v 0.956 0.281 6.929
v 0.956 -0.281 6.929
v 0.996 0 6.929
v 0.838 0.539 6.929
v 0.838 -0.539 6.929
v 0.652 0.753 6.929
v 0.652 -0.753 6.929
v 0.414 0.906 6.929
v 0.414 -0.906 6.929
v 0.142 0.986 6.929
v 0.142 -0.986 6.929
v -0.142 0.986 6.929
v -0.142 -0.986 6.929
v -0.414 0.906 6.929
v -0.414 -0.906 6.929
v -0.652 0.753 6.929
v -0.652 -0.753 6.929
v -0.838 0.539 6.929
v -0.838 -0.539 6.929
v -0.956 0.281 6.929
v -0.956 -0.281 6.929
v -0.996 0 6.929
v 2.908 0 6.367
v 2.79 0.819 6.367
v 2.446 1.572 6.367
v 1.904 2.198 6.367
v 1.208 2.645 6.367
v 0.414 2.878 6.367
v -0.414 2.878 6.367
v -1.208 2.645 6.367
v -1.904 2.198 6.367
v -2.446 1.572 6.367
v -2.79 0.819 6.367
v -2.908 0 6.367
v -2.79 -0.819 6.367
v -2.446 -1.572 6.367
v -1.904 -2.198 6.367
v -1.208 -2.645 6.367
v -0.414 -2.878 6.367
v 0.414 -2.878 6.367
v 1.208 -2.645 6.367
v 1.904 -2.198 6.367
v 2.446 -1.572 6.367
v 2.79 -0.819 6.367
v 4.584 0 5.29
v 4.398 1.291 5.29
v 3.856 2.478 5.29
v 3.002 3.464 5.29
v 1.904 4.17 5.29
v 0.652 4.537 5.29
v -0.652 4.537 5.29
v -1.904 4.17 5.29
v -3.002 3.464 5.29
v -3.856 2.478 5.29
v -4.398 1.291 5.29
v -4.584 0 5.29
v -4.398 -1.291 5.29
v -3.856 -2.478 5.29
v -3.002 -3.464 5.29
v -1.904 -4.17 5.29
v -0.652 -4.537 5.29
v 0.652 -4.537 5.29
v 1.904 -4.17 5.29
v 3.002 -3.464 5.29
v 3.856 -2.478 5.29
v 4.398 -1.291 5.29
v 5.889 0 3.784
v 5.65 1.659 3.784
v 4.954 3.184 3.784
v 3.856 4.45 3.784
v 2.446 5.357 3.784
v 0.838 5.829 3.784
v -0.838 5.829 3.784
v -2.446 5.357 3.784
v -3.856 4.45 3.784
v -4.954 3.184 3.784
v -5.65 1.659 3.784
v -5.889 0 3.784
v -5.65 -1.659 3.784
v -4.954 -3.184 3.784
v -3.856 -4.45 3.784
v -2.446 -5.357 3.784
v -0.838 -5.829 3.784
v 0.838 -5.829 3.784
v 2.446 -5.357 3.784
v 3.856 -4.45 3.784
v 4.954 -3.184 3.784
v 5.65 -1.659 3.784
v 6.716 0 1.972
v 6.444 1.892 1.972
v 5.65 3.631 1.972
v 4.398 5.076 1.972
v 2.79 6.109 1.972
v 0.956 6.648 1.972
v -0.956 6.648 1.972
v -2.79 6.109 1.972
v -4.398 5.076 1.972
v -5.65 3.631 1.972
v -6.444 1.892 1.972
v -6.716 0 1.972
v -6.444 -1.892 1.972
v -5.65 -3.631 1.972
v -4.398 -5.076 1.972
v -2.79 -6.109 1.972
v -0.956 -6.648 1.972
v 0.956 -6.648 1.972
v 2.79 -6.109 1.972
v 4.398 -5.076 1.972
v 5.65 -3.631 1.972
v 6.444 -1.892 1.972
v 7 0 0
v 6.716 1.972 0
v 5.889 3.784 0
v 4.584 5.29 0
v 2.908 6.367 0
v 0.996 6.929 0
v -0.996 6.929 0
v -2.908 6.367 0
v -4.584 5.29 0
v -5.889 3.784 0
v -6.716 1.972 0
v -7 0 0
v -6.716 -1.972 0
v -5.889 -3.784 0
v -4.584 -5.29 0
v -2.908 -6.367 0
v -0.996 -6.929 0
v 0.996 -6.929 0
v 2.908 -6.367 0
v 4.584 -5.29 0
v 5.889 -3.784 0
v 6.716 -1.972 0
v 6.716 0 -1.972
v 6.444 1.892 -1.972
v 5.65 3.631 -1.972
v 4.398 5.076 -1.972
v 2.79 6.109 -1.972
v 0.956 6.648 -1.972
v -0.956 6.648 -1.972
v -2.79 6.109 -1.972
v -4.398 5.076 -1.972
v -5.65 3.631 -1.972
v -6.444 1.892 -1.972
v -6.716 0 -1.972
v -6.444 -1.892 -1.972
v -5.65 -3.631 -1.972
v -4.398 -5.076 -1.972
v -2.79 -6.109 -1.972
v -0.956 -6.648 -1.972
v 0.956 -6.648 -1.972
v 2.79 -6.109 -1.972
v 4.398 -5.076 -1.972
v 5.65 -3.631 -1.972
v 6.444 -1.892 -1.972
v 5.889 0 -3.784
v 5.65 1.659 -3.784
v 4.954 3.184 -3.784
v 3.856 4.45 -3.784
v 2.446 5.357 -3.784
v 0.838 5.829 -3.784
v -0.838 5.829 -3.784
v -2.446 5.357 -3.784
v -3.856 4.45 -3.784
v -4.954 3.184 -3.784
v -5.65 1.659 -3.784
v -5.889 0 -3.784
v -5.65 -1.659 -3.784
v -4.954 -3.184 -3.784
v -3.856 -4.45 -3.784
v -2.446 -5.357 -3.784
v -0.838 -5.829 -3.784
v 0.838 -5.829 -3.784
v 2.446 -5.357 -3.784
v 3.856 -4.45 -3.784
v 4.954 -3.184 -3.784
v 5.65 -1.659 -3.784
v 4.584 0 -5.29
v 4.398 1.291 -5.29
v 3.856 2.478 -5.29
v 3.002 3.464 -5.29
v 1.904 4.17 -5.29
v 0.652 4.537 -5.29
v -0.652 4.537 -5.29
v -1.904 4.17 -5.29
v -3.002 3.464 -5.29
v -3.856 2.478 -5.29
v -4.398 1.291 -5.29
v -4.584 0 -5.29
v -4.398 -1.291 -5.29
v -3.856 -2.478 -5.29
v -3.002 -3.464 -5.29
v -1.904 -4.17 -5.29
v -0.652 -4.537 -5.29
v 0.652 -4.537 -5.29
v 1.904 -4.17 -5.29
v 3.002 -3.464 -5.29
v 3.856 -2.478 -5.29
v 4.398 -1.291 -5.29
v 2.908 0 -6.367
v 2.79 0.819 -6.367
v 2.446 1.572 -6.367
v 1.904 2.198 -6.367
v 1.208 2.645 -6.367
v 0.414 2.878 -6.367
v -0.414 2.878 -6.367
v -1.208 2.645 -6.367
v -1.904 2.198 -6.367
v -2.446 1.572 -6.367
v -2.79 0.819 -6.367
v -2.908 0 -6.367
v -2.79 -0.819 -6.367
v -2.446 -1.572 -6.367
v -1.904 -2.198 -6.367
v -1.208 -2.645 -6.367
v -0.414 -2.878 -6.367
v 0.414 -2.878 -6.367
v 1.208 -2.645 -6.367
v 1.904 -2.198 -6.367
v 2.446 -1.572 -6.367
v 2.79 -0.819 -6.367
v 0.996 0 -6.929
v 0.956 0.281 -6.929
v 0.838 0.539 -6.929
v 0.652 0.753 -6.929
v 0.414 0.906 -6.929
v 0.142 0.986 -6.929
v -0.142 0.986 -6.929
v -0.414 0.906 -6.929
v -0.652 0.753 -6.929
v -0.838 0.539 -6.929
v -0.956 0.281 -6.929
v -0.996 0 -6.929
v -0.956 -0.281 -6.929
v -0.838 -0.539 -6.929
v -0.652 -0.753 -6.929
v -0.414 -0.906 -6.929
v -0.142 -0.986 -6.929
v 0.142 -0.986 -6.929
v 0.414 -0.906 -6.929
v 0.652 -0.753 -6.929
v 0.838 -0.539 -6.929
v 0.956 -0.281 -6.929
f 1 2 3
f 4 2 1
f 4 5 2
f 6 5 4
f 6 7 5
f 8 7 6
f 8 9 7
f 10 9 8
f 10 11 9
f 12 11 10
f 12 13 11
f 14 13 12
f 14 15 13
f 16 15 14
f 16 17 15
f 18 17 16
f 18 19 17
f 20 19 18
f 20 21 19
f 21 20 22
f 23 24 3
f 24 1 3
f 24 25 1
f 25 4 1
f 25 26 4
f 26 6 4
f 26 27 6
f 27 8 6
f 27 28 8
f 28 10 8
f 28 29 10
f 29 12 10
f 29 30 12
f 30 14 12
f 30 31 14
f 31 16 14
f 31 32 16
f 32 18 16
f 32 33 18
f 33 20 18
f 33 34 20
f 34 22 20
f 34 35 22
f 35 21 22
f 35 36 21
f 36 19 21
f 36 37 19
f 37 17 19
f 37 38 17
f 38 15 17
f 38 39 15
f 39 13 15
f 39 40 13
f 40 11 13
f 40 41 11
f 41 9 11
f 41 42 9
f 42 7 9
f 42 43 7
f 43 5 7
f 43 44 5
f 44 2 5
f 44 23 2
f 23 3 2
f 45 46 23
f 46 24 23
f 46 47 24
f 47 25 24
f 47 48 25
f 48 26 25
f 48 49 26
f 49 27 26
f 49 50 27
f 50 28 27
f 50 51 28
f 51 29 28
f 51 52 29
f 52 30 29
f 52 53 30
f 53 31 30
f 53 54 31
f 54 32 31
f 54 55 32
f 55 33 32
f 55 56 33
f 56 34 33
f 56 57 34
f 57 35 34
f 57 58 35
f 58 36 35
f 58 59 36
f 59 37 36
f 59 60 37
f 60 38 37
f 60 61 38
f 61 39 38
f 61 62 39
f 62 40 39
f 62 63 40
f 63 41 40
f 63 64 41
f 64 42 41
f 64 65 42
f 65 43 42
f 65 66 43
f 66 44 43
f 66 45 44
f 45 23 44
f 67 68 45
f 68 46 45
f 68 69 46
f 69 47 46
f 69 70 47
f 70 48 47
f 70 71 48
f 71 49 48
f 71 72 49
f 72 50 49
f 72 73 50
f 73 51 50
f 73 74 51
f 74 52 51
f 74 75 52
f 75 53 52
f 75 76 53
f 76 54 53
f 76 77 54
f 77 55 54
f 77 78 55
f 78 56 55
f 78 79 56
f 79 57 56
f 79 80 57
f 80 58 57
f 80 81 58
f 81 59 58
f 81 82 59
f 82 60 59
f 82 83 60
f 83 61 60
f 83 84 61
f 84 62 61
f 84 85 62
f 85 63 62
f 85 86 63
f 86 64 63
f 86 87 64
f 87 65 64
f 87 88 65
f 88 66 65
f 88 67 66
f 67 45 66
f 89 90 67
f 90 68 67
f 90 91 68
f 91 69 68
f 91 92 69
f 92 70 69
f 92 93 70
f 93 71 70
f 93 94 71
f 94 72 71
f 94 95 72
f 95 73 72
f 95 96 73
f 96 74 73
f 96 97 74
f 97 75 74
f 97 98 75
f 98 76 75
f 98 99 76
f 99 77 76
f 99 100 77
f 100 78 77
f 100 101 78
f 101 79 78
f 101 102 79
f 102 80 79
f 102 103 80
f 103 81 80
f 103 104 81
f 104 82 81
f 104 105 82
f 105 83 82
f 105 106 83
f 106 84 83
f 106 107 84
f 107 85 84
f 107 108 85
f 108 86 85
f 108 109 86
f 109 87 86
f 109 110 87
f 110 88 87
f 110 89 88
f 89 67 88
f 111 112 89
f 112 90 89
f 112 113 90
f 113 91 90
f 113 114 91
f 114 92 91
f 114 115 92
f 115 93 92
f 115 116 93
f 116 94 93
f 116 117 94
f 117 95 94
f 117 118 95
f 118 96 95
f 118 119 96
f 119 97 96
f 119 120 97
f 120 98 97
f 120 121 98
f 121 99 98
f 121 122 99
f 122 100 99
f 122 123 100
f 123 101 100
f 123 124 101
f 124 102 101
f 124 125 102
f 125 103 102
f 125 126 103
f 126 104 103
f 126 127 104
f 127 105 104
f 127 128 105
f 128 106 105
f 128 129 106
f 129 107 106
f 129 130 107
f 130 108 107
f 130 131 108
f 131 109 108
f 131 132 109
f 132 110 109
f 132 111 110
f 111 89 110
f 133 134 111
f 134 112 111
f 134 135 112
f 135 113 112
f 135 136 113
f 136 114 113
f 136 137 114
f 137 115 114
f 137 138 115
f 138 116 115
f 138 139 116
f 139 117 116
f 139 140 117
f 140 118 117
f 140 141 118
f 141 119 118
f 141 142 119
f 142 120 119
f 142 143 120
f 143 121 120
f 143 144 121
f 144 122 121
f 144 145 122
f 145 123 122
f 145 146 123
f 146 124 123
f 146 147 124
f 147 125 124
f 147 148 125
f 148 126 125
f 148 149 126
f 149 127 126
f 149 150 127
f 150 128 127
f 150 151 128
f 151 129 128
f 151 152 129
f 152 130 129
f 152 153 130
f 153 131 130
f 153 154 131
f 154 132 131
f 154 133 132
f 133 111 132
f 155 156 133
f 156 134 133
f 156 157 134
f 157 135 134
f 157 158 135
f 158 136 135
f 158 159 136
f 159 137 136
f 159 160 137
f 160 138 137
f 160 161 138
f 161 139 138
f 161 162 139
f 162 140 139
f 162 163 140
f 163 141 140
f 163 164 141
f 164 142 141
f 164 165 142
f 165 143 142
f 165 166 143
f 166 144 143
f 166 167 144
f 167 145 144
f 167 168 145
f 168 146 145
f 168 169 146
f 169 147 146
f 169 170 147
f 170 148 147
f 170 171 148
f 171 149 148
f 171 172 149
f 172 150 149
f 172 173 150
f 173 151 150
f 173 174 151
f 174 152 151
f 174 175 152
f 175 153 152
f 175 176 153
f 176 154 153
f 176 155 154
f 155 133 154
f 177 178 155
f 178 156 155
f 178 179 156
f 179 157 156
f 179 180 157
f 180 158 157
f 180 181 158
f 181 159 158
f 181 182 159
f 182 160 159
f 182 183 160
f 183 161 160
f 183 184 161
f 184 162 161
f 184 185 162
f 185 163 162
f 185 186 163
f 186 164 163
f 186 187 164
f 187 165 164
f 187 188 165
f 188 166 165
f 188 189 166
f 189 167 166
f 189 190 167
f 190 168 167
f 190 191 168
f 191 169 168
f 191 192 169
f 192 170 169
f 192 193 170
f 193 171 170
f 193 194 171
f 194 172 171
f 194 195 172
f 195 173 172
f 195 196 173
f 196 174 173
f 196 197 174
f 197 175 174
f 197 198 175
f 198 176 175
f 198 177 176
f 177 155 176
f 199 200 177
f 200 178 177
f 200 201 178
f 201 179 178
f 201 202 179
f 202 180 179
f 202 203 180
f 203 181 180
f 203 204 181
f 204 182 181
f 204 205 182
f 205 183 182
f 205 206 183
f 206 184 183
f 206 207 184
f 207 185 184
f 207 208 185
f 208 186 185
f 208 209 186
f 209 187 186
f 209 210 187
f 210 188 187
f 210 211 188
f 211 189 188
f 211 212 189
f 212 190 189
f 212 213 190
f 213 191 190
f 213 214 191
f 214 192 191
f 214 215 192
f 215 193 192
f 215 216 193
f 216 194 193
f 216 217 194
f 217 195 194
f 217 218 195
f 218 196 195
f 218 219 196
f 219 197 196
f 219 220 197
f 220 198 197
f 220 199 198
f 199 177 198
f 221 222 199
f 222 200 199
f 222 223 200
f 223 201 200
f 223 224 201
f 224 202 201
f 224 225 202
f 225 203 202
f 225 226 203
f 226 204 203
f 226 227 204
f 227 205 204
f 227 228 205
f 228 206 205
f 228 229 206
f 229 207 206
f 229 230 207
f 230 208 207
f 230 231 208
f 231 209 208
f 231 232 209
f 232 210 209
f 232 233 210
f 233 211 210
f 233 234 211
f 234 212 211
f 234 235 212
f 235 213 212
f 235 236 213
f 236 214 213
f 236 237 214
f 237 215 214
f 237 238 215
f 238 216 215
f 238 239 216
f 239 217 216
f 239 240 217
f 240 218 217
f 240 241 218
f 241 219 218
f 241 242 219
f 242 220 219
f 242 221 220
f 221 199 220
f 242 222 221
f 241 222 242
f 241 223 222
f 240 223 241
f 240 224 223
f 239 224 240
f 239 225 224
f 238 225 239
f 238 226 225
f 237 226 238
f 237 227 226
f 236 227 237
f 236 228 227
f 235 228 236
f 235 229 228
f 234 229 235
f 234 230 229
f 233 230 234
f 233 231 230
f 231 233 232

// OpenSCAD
// The exact-geometry audit's case x10 (docs/audits/exact-geometry-rust.md).
// volume: 1436.755040241732
sphere(7);
